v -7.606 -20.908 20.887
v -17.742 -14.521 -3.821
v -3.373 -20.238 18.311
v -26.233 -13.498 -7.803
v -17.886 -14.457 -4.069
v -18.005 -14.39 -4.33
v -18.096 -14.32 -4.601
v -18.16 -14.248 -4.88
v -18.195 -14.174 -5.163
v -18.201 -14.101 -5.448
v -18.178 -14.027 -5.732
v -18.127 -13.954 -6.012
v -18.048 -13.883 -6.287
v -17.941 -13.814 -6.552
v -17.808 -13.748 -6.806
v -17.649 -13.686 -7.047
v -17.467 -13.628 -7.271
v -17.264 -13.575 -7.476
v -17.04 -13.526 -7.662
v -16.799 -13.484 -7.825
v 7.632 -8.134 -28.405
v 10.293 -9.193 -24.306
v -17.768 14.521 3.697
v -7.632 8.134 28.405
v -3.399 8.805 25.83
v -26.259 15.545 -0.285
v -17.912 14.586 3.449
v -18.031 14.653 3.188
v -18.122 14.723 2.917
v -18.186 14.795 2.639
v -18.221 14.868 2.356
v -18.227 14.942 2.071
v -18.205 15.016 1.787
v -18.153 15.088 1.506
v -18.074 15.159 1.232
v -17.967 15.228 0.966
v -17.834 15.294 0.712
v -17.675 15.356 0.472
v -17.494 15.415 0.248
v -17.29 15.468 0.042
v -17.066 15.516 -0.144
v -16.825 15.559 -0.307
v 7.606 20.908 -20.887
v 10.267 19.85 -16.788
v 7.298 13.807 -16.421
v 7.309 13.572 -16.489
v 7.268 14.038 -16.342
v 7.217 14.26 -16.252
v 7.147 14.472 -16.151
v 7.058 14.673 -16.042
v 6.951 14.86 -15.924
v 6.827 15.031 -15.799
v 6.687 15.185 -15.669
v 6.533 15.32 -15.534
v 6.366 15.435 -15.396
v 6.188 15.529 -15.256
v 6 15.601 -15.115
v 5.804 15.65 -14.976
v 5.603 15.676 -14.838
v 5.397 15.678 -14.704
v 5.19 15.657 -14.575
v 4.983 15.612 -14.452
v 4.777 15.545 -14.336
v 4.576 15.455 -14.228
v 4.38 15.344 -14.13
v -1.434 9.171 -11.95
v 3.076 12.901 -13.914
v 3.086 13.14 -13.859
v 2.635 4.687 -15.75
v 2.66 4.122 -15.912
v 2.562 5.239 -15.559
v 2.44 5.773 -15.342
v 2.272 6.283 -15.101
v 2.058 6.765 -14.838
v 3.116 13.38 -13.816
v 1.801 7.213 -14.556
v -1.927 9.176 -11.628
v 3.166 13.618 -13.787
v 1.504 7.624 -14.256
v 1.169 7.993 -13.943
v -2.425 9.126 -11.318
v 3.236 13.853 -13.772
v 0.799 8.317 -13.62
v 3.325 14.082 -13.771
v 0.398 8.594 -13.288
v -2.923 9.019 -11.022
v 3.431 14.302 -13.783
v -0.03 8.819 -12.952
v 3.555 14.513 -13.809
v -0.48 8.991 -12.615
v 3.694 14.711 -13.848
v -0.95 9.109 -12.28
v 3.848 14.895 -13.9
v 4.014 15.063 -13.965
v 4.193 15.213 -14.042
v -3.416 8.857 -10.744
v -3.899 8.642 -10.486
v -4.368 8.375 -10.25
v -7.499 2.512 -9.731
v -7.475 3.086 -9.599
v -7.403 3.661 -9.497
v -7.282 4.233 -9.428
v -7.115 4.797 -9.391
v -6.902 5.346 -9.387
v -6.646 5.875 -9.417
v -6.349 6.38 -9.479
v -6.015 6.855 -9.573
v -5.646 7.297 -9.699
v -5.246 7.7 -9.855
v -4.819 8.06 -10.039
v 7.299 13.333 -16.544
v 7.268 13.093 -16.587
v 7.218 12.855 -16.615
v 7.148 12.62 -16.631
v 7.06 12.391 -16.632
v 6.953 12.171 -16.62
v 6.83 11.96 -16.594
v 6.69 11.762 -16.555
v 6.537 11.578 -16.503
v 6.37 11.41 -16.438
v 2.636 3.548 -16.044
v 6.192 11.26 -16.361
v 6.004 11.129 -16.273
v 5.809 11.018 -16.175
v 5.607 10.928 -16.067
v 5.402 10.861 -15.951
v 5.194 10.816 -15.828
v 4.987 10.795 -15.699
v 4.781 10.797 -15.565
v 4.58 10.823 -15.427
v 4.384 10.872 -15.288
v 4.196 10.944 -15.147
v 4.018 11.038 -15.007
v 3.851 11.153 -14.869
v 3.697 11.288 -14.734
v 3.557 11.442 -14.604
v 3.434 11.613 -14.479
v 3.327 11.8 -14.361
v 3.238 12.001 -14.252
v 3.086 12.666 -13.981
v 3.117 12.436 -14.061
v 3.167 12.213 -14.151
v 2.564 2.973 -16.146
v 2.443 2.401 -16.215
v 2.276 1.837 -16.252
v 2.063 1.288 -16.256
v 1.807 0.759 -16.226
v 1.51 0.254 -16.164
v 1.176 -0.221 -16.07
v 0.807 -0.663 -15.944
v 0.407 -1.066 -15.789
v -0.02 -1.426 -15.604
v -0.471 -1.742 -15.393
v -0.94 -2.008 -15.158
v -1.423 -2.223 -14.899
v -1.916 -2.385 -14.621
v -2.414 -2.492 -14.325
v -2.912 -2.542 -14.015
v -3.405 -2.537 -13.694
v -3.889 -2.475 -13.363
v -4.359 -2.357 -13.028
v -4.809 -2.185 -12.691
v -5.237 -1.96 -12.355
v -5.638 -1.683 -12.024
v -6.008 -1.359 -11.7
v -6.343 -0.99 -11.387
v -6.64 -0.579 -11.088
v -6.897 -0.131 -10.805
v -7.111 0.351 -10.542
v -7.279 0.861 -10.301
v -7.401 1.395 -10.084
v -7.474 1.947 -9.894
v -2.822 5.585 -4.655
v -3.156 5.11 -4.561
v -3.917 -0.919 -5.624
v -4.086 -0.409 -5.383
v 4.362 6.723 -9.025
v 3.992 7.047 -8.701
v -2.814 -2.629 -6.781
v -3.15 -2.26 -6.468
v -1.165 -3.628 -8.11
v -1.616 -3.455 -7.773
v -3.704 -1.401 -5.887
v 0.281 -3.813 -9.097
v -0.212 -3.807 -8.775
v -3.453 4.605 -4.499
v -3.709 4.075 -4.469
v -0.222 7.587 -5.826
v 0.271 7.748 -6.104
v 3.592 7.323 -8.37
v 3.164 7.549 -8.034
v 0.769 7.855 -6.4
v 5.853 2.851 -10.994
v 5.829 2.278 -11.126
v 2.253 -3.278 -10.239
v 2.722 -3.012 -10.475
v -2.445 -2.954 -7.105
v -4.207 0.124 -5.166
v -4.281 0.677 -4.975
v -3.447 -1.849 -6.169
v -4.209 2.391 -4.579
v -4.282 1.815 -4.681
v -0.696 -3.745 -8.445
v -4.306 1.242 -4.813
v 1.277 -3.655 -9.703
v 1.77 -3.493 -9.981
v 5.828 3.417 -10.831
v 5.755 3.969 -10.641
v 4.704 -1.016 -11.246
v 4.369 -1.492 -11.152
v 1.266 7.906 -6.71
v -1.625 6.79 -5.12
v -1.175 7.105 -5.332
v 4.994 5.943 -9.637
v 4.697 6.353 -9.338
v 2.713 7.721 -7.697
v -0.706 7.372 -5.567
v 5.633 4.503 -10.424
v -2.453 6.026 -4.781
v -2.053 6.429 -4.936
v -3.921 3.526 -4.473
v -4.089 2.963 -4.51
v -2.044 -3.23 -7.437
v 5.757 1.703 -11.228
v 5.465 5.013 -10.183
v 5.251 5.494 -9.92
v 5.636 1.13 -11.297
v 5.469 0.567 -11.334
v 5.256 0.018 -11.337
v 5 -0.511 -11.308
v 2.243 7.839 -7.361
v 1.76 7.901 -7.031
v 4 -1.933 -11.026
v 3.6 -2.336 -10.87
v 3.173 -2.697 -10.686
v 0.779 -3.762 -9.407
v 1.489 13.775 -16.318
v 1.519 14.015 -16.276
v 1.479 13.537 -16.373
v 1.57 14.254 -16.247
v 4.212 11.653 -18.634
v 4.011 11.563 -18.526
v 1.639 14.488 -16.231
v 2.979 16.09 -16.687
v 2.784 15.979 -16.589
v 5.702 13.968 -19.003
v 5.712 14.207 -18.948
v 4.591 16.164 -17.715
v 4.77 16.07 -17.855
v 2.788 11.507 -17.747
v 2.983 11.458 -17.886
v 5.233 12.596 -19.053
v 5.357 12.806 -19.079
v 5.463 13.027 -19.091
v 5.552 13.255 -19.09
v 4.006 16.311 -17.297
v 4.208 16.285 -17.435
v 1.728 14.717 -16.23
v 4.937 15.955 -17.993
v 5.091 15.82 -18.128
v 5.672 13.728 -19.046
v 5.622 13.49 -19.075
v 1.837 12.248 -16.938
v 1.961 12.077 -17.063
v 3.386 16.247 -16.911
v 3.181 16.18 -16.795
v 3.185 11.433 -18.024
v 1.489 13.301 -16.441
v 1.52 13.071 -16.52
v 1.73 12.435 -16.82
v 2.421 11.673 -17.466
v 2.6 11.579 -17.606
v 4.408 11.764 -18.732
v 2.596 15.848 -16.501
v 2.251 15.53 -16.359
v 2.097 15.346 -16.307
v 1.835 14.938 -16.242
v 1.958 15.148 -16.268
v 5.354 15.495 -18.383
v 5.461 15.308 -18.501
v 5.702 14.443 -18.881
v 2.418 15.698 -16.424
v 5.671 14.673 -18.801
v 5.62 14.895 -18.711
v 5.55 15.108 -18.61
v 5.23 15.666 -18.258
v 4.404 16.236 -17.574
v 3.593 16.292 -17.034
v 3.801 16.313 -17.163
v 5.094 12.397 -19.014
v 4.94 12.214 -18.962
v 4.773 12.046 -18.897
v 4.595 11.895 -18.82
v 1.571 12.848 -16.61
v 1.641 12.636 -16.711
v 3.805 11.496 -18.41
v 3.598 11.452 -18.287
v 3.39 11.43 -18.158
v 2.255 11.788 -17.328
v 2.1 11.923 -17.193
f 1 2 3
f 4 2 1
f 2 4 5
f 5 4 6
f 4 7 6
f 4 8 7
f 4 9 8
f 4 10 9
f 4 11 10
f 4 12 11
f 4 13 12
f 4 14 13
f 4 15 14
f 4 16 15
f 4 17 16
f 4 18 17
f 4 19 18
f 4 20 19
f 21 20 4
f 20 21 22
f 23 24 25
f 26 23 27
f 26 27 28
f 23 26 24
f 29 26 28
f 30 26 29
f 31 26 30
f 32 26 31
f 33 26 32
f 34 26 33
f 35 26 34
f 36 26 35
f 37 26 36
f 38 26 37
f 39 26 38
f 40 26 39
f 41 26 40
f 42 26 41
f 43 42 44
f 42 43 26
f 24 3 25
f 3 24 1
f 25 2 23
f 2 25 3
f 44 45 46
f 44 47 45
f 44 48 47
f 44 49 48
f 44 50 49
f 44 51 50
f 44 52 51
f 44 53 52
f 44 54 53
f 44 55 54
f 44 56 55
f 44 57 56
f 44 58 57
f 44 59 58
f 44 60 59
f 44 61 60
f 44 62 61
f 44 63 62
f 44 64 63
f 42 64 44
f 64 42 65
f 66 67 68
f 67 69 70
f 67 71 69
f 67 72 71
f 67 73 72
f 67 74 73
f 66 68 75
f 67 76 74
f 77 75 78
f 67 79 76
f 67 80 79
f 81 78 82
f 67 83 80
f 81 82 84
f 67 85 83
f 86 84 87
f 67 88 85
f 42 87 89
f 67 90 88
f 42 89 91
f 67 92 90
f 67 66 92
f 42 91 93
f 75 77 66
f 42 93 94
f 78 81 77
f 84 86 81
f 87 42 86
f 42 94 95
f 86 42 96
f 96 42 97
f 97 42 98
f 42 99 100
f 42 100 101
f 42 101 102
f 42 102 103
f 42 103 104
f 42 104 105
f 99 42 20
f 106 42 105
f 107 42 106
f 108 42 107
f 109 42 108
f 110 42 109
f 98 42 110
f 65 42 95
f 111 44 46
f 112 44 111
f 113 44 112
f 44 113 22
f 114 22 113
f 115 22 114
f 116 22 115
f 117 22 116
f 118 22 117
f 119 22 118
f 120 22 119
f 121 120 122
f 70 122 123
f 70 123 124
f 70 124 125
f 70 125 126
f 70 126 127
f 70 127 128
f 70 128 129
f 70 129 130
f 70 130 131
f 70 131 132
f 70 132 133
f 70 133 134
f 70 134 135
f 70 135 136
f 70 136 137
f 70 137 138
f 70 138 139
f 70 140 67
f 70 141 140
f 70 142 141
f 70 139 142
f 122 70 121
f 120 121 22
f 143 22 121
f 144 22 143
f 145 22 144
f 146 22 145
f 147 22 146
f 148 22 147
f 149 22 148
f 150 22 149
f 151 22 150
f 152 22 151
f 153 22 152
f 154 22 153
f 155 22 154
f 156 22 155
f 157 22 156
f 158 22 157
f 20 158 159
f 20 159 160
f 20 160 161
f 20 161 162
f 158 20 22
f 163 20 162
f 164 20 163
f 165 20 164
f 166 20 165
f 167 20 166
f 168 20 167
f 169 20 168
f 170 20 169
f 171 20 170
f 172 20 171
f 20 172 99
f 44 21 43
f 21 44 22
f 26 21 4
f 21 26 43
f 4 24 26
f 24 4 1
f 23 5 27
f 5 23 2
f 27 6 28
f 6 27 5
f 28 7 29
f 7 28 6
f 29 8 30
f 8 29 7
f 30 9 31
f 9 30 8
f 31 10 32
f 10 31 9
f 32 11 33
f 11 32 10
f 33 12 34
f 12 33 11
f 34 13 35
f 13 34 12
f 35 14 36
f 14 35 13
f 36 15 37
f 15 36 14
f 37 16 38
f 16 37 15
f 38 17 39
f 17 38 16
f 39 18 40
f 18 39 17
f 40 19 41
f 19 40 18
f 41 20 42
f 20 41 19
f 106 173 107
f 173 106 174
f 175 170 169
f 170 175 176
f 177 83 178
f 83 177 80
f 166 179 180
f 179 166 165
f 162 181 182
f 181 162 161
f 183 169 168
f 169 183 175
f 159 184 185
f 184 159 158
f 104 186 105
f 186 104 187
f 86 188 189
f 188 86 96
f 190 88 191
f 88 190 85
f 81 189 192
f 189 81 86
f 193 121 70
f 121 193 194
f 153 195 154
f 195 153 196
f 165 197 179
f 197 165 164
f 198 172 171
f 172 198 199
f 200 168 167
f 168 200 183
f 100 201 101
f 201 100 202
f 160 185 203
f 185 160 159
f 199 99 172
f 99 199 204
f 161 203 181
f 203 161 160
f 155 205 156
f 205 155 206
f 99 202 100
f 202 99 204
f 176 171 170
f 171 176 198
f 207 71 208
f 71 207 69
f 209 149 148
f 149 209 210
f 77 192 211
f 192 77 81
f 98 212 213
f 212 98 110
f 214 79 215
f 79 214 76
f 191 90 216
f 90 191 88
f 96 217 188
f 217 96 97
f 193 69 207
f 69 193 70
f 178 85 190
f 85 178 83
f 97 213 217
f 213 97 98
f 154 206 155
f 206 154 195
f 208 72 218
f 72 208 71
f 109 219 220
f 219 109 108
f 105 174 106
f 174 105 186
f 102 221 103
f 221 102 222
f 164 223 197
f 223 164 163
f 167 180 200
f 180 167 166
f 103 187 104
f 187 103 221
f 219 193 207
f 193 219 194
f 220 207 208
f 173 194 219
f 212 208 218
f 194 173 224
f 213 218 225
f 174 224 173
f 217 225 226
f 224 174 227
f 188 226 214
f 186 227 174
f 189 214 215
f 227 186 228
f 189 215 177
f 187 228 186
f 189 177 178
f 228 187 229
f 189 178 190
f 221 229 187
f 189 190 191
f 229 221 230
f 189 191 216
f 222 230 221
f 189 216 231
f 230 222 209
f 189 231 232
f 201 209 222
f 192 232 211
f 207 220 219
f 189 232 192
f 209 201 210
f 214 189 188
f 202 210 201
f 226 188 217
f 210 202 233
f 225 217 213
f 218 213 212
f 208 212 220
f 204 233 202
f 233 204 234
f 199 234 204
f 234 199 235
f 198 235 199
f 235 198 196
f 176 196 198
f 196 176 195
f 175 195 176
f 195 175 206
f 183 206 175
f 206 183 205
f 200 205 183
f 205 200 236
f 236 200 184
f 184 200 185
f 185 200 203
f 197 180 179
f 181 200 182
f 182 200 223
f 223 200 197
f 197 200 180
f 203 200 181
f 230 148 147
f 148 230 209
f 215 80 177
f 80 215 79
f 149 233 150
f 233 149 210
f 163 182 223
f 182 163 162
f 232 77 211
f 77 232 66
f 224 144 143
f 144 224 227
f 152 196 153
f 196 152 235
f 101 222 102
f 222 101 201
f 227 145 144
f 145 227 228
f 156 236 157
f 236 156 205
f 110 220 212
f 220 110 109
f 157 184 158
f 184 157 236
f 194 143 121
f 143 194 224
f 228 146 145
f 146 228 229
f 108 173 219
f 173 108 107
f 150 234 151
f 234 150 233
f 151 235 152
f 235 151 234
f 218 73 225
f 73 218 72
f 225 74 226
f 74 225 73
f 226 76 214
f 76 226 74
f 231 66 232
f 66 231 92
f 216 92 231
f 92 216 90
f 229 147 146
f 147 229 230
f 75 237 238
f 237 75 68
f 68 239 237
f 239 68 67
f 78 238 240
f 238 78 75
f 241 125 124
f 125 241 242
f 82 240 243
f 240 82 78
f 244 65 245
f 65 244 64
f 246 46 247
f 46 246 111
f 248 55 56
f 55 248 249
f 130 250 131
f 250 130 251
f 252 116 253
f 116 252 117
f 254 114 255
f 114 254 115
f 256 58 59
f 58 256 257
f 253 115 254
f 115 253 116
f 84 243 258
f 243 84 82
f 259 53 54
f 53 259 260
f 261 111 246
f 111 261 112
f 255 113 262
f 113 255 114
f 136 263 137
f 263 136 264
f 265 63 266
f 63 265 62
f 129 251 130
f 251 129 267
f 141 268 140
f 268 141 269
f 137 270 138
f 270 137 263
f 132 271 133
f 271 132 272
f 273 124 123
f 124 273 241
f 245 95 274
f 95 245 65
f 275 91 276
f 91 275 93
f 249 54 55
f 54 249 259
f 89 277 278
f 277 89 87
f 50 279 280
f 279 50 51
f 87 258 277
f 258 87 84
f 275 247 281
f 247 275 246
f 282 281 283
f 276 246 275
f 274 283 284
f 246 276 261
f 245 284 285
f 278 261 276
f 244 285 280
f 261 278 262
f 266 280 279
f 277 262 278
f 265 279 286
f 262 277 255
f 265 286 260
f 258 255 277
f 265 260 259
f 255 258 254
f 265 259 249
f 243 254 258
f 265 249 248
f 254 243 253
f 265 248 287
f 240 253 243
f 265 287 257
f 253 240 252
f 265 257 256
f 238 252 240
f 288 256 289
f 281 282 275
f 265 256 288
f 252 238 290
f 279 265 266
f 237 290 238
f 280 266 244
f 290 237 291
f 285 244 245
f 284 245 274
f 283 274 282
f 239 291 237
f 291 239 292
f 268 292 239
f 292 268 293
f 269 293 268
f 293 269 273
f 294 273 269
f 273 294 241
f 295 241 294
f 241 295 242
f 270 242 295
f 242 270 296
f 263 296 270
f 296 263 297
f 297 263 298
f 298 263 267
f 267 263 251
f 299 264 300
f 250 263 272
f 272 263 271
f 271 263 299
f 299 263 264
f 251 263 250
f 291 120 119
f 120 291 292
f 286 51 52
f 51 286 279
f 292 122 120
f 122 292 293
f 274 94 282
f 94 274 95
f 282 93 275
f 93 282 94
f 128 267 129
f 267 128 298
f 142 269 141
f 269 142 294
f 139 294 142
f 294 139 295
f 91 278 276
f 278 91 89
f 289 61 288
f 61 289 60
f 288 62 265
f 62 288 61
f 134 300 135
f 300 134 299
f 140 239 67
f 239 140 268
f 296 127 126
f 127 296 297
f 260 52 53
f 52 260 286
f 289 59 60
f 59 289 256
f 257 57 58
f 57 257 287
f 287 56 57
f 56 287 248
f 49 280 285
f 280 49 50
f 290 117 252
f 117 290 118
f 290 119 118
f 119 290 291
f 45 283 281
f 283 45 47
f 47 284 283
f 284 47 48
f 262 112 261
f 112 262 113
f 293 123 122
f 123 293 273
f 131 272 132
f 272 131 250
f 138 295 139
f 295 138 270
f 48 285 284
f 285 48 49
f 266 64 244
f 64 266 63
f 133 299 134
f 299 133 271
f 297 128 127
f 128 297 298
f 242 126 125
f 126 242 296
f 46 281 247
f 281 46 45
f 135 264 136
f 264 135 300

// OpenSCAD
// Source: OpenSCAD_Model
// Gate limit: 0.0794481408152 mm; measured Hausdorff: 0.00000189376446278 mm
// Before snapping Hausdorff: 0.00000196307937348 mm
// How to edit: change Customizer parameters; host expressions move attached features.
// Assertions stop edits that violate linked dimensions. Distances are in mm.
/* [Body] */
// body width (raw 40.0000007699)
body_width = 40; // [0.01:0.01:80]
// body height (raw 35.0000002949)
body_height = 35; // [0.01:0.01:70]
// body depth (raw 30.0000000116)
body_depth = 30; // [0.01:0.01:60]
// base thickness (raw 4.99999954093)
base_thickness = 5; // [0.01:0.01:35]
// wall thickness (raw 4.99999962222)
wall_thickness = 5; // [0.01:0.01:40]
/* [Fillet 1] */
// fillet 1 radius (raw 3.00000158688)
fillet_1_radius = 3; // [0.01:0.01:30]
/* [Boss 1] */
// boss 1 radius (raw 5.99999998925)
boss_1_radius = 6; // [0.01:0.01:14.99]
// boss 1 x (raw 15.0000004051)
boss_1_x = 15; // [0:0.01:40]
// boss 1 z (raw 14.99999997)
boss_1_z = 15; // [0:0.01:30]
// boss 1 height (raw 6.00000002328)
boss_1_height = 6; // [0.01:0.01:40]
/* [Blind Hole 1] */
// blind hole 1 radius (raw 2.4999999459)
blind_hole_1_radius = 2.5; // [0.01:0.01:5.99]
// blind hole 1 x (raw 6.00000045717)
blind_hole_1_x = 6; // [0:0.01:40]
// blind hole 1 z (raw 23.999999977)
blind_hole_1_z = 24; // [0:0.01:30]
// blind hole 1 depth (raw 3.0000000383)
blind_hole_1_depth = 3; // [0.01:0.01:4.99]
/* [Hidden] */
$fn = 64;
_join_epsilon = max(body_width, body_depth)*0.000001;
assert(base_thickness < body_height && wall_thickness < body_width, "Body legs must have positive free lengths");
assert(fillet_1_radius < body_width-wall_thickness && fillet_1_radius < body_height-base_thickness, "Fillet must fit between the free leg ends");
assert(boss_1_x > boss_1_radius && boss_1_x+boss_1_radius < body_width && boss_1_z > boss_1_radius && boss_1_z+boss_1_radius < body_depth, "Cylinder must stay inside the host footprint");
assert(boss_1_x+boss_1_radius+fillet_1_radius < body_width-wall_thickness, "Cylinder must clear the wall");
assert(blind_hole_1_depth < base_thickness, "Blind hole must leave a floor");
assert(blind_hole_1_x > blind_hole_1_radius && blind_hole_1_x+blind_hole_1_radius < body_width && blind_hole_1_z > blind_hole_1_radius && blind_hole_1_z+blind_hole_1_radius < body_depth, "Cylinder must stay inside the host footprint");
assert(blind_hole_1_x+blind_hole_1_radius+fillet_1_radius < body_width-wall_thickness, "Cylinder must clear the wall");
assert(body_width > 0 && body_height > 0 && body_depth > 0 && base_thickness > 0 && wall_thickness > 0 && fillet_1_radius > 0 && boss_1_radius > 0 && boss_1_height > 0 && blind_hole_1_radius > 0 && blind_hole_1_depth > 0, "Dimensions must stay positive");
assert(norm([boss_1_x-blind_hole_1_x, boss_1_z-blind_hole_1_z]) > boss_1_radius+blind_hole_1_radius, "Features on one host must not overlap");
multmatrix([[-0.846614146499, 0.5322064725, -0.000870388857283, 7.63172606352], [-0.134090512117, -0.211722926797, 0.968087360122, -8.13434889471], [0.515038077726, 0.819713165014, 0.250611463414, -28.4049138871], [0, 0, 0, 1]])
difference() {
  union() {
    // face F0 body_1_boundary (plane)
    // face F1 body_1_boundary (plane)
    // face F3 body_1_boundary (plane)
    // face F4 base_top (plane)
    // face F5 body_1_boundary (plane)
    // face F6 body_1_boundary (plane)
    // face F7 body_1_boundary (plane)
    // face F8 body_1_boundary (plane)
    // P0 = [0, base_thickness]
    // P1 = [0, 0]
    // P2 = [body_width, 0]
    // P3 = [body_width, body_height]
    // P4 = [body_width-wall_thickness, body_height]
    // P5 = [body_width-wall_thickness, base_thickness]
    linear_extrude(height=body_depth) polygon(points=[[0, base_thickness], [0, 0], [body_width, 0], [body_width, body_height], [body_width-wall_thickness, body_height], [body_width-wall_thickness, base_thickness]]);
    // face F2 fillet_1 (cylinder)
    linear_extrude(height=body_depth) difference() {
      polygon(points=[[(body_width-wall_thickness)+sign((body_width-wall_thickness)-(body_width-wall_thickness-fillet_1_radius))*_join_epsilon, (base_thickness)+sign((base_thickness)-(base_thickness+fillet_1_radius))*_join_epsilon], [body_width-wall_thickness-fillet_1_radius, (base_thickness)+sign((base_thickness)-(base_thickness+fillet_1_radius))*_join_epsilon], [body_width-wall_thickness-fillet_1_radius, base_thickness+fillet_1_radius], [(body_width-wall_thickness)+sign((body_width-wall_thickness)-(body_width-wall_thickness-fillet_1_radius))*_join_epsilon, base_thickness+fillet_1_radius]]);
      translate([body_width-wall_thickness-fillet_1_radius, base_thickness+fillet_1_radius]) circle(r=fillet_1_radius);
    }
    // face F9 boss_1_side (cylinder)
    // face F10 boss_1_cap (plane)
    translate([boss_1_x, (base_thickness)-(1)*_join_epsilon, boss_1_z]) rotate(a=90, v=[-1, 0, 0]) cylinder(r=boss_1_radius, h=boss_1_height+_join_epsilon);
  }
  // face F11 blind_hole_1_side (cylinder)
  // face F12 blind_hole_1_floor (plane)
  translate([blind_hole_1_x, (base_thickness)-(-1)*_join_epsilon, blind_hole_1_z]) rotate(a=90, v=[1, 0, 0]) cylinder(r=blind_hole_1_radius, h=blind_hole_1_depth+_join_epsilon);
}
